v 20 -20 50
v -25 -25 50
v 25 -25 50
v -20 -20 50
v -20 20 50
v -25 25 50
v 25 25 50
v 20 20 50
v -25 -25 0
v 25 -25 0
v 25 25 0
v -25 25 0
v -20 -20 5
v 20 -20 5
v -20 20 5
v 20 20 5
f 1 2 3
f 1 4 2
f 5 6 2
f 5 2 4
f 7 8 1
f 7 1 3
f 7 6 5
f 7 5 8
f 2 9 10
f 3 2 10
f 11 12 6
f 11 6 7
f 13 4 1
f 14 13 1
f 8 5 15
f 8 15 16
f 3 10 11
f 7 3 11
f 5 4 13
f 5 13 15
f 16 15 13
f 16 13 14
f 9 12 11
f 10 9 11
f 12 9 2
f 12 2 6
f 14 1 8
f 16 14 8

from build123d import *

# Parameters (mm, degrees)
F0_W     = 50
F0_H     = 50
F0_W_2   = 40
F0_H_2   = 40
F1_DEPTH = 50
F2_W     = 40
F2_H     = 5
F3_DEPTH = 40


with BuildPart() as f1:
    # F0 (on Top) → F1 (new body)
    with BuildSketch(Plane.XY):
        Rectangle(F0_W, F0_H)
        Rectangle(F0_W_2, F0_H_2, mode=Mode.SUBTRACT)
    extrude(amount=F1_DEPTH)

    # F2 (on face) → F3 (join)
    with BuildSketch(Plane.XZ.offset(-20)):
        with Locations((0, 2.5)):
            Rectangle(F2_W, F2_H)
    extrude(amount=F3_DEPTH)


solid = f1.part
